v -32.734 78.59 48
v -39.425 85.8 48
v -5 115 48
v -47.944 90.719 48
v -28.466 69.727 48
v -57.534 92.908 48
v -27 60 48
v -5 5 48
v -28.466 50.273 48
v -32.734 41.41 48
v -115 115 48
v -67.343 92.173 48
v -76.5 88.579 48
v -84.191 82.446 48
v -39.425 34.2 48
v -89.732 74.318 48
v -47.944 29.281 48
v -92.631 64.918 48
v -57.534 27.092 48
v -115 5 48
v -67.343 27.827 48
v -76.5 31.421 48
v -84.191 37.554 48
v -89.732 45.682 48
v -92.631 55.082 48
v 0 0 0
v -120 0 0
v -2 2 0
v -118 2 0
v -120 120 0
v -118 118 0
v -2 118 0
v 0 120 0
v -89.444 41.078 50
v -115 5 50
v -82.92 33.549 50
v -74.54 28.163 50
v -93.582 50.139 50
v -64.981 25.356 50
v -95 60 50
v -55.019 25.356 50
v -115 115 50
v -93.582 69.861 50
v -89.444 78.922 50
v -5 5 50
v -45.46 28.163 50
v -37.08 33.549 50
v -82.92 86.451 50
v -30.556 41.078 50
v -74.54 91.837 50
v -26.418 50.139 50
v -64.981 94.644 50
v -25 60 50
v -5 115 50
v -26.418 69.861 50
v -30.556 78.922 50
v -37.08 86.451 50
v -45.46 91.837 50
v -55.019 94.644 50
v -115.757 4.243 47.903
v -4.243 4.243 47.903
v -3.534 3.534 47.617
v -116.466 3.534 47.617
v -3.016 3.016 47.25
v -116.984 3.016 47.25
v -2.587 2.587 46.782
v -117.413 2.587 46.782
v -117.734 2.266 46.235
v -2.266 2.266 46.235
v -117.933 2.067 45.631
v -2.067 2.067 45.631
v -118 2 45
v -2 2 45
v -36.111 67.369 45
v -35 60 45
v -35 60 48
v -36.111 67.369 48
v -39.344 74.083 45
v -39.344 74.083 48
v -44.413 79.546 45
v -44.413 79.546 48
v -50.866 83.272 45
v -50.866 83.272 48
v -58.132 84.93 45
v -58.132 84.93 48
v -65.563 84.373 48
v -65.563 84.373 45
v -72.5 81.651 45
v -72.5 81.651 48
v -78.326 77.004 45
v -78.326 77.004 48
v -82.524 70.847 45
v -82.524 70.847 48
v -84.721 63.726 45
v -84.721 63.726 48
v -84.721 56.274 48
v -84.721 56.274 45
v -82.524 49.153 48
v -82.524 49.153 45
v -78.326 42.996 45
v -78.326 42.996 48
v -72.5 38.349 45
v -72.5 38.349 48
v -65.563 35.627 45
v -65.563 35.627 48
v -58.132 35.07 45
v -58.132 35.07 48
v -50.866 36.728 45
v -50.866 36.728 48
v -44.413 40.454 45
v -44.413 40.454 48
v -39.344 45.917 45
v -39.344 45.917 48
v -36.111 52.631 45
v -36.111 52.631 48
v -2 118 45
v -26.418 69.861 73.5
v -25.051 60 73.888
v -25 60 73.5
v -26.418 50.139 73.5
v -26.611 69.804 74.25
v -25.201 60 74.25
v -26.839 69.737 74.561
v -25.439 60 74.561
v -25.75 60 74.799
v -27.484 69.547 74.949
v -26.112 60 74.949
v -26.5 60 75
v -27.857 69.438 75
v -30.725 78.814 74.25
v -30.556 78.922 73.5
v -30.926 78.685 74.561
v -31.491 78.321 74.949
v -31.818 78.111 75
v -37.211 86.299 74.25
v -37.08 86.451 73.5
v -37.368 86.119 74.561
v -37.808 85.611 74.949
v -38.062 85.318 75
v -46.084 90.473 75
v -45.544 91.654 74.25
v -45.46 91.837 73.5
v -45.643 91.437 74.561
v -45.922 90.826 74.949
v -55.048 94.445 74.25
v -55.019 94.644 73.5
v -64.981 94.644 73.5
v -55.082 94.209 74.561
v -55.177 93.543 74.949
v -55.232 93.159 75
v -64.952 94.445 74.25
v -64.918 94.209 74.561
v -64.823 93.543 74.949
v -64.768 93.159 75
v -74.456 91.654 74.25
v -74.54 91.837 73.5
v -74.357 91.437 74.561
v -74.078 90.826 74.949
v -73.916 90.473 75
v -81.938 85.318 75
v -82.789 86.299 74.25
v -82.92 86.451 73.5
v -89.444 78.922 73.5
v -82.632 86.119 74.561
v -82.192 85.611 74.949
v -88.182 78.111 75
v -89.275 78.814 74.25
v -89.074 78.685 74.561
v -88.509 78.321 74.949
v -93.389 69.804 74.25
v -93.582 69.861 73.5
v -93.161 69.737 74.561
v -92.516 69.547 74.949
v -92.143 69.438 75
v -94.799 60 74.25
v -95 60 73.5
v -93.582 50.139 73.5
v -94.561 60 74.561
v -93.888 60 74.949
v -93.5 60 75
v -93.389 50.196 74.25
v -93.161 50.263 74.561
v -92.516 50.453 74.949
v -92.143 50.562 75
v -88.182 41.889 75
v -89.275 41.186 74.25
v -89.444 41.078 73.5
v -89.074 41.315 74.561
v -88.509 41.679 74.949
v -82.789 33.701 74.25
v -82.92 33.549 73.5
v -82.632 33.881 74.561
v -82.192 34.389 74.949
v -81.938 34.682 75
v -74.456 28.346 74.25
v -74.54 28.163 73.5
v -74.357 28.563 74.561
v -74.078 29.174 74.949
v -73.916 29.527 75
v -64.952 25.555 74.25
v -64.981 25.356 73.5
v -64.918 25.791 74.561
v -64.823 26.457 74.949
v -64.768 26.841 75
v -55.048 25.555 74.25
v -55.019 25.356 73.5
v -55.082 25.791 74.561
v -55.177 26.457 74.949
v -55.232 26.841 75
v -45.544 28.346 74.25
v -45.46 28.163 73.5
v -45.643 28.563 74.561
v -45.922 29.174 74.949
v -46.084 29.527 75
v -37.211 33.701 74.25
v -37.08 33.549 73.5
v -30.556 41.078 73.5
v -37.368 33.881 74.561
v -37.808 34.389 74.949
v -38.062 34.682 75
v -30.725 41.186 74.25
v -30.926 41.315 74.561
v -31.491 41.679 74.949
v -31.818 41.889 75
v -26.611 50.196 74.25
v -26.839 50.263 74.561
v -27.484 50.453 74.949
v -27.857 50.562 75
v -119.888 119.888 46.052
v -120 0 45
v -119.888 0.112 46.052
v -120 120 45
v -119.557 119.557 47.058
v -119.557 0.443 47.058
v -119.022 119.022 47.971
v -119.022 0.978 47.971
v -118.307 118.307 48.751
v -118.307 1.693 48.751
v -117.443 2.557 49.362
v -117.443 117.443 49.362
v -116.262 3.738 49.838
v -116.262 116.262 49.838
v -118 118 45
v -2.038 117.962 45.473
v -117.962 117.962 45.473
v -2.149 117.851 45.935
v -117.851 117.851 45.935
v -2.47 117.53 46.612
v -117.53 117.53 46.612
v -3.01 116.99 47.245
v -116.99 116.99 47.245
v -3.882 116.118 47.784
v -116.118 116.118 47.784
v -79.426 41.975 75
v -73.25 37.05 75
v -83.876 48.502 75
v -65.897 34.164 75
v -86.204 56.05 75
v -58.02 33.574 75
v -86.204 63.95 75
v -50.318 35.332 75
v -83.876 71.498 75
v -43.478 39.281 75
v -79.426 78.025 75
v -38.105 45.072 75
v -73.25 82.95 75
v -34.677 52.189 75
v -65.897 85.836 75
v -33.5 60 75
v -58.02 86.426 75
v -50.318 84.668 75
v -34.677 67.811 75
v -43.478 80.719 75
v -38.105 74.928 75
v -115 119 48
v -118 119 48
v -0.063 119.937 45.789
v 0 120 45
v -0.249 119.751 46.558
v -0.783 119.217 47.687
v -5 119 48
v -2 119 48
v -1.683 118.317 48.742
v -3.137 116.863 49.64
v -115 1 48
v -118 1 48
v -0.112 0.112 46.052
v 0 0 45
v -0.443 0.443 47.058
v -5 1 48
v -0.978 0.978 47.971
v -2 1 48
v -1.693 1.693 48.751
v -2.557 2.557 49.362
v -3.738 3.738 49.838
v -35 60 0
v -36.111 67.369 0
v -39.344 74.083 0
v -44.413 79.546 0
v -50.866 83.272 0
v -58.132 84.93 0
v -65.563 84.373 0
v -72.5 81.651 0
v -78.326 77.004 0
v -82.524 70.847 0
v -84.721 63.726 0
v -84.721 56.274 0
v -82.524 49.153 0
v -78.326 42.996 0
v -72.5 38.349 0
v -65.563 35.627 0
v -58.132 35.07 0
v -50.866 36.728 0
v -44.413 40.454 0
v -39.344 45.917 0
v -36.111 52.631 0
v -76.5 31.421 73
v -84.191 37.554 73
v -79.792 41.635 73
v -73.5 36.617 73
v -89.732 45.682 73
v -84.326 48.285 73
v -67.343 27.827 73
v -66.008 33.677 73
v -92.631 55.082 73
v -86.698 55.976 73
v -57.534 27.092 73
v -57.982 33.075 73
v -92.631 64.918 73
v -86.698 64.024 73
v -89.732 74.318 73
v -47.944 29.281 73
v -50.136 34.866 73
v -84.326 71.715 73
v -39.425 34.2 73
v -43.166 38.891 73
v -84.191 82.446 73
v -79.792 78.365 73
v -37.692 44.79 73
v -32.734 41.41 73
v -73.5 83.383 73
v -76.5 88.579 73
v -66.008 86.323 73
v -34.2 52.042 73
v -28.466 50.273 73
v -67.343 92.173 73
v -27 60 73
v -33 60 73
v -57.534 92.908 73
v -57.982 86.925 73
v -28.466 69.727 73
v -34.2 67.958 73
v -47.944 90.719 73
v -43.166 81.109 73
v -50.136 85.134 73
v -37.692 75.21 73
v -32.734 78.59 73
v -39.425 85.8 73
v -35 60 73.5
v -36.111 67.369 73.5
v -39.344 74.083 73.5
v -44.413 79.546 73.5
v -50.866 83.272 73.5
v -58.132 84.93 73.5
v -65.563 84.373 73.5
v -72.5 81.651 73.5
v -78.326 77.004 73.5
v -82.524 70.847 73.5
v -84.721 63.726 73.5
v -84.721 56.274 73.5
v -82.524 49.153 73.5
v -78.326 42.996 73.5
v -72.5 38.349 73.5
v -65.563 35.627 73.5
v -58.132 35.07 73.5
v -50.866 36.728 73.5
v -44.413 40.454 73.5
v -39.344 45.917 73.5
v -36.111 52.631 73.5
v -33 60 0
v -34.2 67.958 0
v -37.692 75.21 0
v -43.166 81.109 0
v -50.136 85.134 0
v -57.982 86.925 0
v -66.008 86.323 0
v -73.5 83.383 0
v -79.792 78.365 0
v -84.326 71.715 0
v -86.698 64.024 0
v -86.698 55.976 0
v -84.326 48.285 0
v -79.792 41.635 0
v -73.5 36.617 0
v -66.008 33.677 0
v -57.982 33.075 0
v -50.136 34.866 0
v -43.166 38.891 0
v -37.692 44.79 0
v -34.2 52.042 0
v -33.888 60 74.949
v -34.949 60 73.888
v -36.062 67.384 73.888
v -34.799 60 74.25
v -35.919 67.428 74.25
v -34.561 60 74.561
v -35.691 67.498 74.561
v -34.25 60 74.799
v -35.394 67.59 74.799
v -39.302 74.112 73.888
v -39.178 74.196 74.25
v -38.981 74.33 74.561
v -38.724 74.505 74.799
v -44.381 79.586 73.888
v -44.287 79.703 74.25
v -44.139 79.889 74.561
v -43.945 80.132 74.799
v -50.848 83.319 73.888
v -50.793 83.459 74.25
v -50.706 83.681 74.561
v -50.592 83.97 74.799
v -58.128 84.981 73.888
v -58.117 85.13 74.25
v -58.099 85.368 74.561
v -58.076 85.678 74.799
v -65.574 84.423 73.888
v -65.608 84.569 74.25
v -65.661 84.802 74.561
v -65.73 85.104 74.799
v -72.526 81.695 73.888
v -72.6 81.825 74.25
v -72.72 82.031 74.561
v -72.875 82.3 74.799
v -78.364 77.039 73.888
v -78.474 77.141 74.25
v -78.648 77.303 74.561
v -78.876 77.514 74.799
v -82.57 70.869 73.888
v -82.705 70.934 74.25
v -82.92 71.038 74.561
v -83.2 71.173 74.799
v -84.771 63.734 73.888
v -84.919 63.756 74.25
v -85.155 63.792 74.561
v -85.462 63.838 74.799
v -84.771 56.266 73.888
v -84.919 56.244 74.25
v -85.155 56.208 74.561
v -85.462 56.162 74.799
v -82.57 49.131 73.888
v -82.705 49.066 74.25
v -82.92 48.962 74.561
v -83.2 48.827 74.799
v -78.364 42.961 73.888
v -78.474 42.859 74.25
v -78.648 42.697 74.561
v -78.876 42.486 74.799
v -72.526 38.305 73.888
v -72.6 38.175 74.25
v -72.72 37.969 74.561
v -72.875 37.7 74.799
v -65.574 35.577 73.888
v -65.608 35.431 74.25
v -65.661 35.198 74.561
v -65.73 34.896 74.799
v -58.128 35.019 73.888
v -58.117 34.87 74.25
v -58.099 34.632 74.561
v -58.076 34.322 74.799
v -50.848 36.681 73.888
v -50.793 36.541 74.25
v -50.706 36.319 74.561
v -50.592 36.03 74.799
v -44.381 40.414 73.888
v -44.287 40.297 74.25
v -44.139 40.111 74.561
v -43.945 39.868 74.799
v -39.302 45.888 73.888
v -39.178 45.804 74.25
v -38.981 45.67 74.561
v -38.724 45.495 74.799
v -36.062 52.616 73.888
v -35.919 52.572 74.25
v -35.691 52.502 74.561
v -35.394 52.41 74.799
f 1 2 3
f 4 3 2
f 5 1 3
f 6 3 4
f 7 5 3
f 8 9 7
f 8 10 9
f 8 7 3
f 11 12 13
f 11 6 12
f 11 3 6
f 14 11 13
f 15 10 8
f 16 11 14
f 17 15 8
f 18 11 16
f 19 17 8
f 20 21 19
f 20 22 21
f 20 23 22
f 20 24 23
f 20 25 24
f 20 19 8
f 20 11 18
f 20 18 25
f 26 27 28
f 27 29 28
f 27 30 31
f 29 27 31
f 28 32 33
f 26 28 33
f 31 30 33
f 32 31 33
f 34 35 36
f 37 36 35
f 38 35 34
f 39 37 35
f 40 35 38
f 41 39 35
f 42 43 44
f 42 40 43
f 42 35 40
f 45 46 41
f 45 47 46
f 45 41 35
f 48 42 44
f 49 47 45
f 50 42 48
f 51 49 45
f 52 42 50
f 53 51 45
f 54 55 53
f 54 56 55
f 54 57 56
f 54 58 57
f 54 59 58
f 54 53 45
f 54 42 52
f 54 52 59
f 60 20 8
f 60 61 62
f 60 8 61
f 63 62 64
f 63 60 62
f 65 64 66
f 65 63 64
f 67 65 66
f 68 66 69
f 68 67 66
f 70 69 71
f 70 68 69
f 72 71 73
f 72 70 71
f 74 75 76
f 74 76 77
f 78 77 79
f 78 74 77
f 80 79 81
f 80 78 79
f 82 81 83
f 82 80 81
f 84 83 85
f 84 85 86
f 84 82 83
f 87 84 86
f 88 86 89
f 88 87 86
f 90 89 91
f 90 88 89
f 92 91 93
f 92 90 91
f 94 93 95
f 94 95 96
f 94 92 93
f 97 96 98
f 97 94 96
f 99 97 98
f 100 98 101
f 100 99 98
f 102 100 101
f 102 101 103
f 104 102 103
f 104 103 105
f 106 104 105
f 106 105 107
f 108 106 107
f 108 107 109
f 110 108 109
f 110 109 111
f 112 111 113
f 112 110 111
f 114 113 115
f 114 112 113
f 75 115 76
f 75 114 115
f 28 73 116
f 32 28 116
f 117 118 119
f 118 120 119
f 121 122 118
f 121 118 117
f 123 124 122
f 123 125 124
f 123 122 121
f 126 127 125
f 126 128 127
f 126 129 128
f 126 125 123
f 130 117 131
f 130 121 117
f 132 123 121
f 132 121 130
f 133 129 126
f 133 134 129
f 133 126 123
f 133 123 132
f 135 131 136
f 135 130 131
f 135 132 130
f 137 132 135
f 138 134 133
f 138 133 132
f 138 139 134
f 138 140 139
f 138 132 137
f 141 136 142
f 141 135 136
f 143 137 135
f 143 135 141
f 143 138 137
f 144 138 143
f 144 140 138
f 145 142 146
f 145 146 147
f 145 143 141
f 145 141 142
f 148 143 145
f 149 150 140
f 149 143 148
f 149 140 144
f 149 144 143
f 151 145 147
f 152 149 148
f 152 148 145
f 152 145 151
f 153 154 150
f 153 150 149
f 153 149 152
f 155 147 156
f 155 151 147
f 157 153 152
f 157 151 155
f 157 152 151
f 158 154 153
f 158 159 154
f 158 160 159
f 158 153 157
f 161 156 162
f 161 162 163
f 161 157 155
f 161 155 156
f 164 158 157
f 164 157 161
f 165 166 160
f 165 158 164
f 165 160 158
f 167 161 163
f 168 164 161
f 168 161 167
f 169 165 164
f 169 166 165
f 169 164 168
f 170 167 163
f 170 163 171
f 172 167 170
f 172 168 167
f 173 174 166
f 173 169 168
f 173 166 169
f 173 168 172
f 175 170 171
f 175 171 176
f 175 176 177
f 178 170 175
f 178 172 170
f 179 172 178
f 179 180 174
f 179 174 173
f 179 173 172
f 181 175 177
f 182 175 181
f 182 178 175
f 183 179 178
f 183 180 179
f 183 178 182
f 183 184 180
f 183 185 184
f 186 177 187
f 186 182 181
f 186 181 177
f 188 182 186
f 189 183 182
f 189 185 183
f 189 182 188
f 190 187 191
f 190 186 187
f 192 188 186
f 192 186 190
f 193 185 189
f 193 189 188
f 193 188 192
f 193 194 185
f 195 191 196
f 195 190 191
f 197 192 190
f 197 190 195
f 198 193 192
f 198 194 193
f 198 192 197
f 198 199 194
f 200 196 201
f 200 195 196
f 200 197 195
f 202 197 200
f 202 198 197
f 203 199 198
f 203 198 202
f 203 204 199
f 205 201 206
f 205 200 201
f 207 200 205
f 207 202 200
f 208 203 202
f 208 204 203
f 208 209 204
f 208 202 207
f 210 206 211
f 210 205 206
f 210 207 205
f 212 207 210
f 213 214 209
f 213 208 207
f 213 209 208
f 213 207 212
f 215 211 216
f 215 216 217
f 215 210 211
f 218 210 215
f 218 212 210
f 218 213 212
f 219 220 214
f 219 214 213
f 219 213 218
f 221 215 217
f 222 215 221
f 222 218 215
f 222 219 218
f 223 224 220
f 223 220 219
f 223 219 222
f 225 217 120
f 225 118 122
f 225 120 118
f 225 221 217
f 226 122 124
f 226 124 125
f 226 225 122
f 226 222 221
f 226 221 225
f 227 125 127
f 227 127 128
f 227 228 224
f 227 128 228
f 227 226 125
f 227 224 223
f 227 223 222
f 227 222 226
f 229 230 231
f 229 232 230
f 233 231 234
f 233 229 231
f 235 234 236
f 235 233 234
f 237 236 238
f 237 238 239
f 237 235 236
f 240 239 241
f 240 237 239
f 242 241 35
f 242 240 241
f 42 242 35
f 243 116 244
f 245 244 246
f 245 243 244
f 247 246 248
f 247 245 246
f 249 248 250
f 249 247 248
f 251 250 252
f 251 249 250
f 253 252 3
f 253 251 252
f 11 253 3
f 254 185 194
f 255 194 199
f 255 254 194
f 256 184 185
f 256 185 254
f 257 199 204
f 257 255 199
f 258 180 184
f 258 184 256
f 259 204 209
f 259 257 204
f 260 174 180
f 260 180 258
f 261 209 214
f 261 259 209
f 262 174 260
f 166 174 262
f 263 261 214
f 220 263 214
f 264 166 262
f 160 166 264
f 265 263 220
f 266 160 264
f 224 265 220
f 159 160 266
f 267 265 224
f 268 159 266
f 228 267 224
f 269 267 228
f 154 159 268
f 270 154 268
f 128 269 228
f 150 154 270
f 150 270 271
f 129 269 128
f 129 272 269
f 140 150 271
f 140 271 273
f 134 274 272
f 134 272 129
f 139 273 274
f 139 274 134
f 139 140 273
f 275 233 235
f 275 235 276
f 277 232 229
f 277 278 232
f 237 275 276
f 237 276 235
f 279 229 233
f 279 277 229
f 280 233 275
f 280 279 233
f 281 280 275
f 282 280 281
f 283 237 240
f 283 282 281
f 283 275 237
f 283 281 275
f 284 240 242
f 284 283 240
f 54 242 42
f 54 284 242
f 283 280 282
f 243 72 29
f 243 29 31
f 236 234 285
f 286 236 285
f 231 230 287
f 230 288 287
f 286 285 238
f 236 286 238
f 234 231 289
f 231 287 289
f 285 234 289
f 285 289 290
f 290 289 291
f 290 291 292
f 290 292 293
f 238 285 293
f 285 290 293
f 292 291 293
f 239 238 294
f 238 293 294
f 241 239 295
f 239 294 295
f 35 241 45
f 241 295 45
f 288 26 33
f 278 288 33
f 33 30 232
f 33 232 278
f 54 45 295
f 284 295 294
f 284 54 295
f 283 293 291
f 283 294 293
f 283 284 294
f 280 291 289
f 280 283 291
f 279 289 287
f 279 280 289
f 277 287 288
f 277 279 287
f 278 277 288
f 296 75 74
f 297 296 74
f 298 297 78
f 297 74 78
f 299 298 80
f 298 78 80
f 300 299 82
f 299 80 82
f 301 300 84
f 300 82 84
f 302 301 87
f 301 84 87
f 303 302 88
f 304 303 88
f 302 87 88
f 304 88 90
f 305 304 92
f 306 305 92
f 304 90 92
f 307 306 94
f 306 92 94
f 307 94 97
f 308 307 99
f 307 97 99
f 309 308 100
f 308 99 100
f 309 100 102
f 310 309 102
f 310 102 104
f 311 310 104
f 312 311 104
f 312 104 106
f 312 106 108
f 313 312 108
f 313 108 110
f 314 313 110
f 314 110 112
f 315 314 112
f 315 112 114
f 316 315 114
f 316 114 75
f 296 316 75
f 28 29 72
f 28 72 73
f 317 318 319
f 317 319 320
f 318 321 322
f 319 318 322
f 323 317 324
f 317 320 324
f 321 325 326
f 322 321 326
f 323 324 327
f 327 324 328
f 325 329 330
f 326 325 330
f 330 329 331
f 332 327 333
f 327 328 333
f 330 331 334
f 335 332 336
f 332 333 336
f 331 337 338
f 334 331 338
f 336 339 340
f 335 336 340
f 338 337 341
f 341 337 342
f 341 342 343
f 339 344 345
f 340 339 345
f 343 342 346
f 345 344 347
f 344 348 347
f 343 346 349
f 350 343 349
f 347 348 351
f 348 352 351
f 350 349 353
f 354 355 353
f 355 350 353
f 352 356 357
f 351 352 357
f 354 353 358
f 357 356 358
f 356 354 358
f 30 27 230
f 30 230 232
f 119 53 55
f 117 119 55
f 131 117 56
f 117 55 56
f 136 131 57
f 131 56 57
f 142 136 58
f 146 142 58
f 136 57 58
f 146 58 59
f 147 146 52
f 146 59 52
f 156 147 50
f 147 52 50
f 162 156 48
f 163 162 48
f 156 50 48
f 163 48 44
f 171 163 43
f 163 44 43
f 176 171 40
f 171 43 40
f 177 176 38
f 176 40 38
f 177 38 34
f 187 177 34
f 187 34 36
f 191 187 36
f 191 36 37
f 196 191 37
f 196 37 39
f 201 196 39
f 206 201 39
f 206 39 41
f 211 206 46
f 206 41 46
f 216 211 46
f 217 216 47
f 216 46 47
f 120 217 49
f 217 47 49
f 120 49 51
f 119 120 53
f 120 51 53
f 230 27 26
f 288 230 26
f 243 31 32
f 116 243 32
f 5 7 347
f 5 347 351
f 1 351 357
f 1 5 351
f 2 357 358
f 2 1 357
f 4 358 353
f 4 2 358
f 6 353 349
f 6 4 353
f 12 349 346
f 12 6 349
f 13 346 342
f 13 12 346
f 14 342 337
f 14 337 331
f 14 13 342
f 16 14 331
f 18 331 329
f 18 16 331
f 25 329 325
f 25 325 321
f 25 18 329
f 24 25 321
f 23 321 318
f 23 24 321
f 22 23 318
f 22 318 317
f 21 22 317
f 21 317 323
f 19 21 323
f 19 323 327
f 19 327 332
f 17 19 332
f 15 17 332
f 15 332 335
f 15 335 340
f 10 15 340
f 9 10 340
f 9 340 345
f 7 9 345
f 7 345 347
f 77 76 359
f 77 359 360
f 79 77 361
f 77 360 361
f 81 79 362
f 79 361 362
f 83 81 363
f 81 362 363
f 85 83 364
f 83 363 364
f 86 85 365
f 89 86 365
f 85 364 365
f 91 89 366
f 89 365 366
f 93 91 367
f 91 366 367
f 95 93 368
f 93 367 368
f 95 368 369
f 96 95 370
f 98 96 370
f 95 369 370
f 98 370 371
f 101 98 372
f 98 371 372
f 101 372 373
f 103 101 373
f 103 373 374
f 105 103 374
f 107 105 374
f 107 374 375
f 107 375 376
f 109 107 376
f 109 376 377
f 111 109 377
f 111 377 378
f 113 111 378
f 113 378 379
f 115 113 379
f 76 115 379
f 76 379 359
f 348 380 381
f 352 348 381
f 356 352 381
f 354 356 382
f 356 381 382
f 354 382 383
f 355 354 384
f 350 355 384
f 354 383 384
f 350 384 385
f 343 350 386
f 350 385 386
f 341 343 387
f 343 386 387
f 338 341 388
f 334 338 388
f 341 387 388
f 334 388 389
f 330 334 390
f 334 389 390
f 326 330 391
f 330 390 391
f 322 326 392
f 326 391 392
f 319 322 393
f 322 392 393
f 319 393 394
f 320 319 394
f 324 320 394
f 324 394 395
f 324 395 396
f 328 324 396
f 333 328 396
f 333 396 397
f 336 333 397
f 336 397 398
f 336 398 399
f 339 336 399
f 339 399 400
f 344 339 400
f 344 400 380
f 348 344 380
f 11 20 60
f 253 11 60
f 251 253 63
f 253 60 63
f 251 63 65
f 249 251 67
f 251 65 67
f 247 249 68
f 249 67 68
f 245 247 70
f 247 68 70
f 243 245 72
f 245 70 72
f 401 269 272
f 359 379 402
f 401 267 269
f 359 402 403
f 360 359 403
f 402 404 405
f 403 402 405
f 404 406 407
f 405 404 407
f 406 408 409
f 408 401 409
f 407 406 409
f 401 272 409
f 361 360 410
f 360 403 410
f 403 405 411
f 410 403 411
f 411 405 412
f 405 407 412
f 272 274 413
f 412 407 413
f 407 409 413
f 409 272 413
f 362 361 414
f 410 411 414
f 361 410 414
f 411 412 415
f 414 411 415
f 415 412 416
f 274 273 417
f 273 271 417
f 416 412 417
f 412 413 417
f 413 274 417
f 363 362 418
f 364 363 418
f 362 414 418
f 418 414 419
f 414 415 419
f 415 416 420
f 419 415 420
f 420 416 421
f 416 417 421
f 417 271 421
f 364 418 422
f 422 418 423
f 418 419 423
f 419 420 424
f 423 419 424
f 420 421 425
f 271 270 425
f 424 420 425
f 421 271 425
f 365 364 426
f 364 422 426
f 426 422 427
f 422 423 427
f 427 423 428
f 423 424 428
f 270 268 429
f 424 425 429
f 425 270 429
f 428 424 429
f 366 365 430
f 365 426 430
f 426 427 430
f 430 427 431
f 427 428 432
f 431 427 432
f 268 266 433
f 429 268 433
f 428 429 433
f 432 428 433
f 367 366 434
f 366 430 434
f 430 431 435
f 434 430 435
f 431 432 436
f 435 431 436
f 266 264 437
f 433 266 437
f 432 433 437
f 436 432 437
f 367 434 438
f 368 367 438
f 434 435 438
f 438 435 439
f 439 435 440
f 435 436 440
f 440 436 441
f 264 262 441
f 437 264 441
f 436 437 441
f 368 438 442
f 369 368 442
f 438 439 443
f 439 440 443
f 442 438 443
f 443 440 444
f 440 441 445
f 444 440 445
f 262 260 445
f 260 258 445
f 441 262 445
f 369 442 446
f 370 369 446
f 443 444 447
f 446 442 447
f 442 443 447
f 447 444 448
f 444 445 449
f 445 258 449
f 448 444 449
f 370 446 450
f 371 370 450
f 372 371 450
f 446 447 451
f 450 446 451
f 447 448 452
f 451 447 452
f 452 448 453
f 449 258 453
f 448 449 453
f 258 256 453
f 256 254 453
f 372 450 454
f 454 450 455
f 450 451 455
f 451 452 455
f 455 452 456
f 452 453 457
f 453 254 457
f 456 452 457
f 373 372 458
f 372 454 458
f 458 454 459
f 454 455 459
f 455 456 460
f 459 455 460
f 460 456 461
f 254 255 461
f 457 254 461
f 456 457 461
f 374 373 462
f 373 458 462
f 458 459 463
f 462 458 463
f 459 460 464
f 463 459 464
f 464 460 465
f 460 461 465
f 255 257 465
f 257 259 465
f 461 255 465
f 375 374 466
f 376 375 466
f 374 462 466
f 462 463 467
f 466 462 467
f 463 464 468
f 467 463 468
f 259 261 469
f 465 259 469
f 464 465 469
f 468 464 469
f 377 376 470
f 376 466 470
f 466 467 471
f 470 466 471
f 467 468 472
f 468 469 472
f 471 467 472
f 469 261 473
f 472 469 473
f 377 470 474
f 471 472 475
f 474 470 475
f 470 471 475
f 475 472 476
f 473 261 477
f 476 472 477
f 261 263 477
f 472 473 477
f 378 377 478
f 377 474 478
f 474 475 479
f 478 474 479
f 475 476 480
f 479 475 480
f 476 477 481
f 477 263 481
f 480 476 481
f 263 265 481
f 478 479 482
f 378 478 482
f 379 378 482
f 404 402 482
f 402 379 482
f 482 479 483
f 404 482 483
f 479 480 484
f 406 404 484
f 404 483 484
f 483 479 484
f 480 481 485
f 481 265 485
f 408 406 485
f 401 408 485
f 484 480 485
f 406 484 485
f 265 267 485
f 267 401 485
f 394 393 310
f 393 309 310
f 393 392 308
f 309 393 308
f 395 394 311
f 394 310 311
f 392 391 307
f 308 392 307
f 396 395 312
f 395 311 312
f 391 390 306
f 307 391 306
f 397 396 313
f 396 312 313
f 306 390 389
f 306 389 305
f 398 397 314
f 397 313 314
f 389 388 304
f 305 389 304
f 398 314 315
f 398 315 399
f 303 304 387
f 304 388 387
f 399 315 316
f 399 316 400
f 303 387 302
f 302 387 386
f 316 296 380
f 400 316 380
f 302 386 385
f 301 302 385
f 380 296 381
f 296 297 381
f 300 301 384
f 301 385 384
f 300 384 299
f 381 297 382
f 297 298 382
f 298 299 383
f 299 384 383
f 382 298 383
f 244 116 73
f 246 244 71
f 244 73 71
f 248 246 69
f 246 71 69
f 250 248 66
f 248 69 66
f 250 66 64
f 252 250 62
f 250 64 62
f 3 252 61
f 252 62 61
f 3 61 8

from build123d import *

# Parameters (mm, degrees)
SKETCH2_W            = 120
SKETCH2_H            = 120
BOSS_EXTRUDE1_DEPTH  = 50
SKETCH3_R            = 35
BOSS_EXTRUDE2_DEPTH  = 25
SKETCH4_R            = 25
CUT_EXTRUDE1_DEPTH   = 186.539753153
FILLET1_R            = 5
FILLET2_R            = 1.5
SHELL1_OUTLINE_W     = 116
SHELL1_OUTLINE_H     = 116
SHELL1_OUTLINE_R     = 27
SHELL1_DEPTH         = 45
SHELL1_2_OUTLINE_R   = 33
SHELL1_2_OUTLINE_R_2 = 27
SHELL1_2_DEPTH       = 73
SHELL1_START         = -118
SHELL1_3_DEPTH       = 116
SHELL1_START_2       = 1
SHELL1_4_DEPTH       = 118
SHELL1_START_3       = 45
SHELL1_5_OUTLINE_R   = 27
SHELL1_5_OUTLINE_R_2 = 25
SHELL1_5_DEPTH       = 3


with BuildPart() as part:
    # Sketch2 → Boss-Extrude1 (new body)
    with BuildSketch(Plane.XY):
        with Locations((-60, 60)):
            Rectangle(SKETCH2_W, SKETCH2_H)
    extrude(amount=BOSS_EXTRUDE1_DEPTH)

    # Sketch3 → Boss-Extrude2 (add)
    with BuildSketch(Plane.XY.offset(50)):
        with Locations((-60, 60)):
            Circle(SKETCH3_R)
    extrude(amount=BOSS_EXTRUDE2_DEPTH)

    # Sketch4 → Cut-Extrude1 (cut, through all)
    with BuildSketch(Plane.XY.offset(75)):
        with Locations((-60, 60)):
            Circle(SKETCH4_R)
    extrude(amount=-CUT_EXTRUDE1_DEPTH, mode=Mode.SUBTRACT)

    # Fillet1
    fillet1_edges = [part.edges().sort_by_distance(p)[0] for p in [
        (-120, 60, 50),
        (-60, 0, 50),
        (0, 60, 50),
        (-60, 120, 50),
    ]]
    fillet(fillet1_edges, radius=FILLET1_R)

    # Fillet2
    fillet2_edges = [part.edges().sort_by_distance(p)[0] for p in [
        (-95, 60, 75),
        (-85, 60, 75),
    ]]
    fillet(fillet2_edges, radius=FILLET2_R)

    # Shell1: read off the stored shape, not the designer's step
    # Shell1 outline → Shell1 (cut)
    with BuildSketch(Plane.XY):
        with Locations((-60, 60)):
            Rectangle(SHELL1_OUTLINE_W, SHELL1_OUTLINE_H)
        with Locations((-60, 60)):
            Circle(SHELL1_OUTLINE_R, mode=Mode.SUBTRACT)
    extrude(amount=SHELL1_DEPTH, mode=Mode.SUBTRACT)

    # Shell1 2 outline → Shell1 2 (cut)
    with BuildSketch(Plane.XY):
        with Locations((-60, 60)):
            Circle(SHELL1_2_OUTLINE_R)
        with Locations((-60, 60)):
            Circle(SHELL1_2_OUTLINE_R_2, mode=Mode.SUBTRACT)
    extrude(amount=SHELL1_2_DEPTH, mode=Mode.SUBTRACT)

    # Shell1 3 outline → Shell1 3 (cut)
    with BuildSketch(Plane.YZ.offset(SHELL1_START)):
        with BuildLine():
            ThreePointArc((118, 45), (117.121320344, 47.121320344), (115, 48))
            Line((115, 48), (5, 48))
            ThreePointArc((5, 48), (2.878679656, 47.121320344), (2, 45))
            Line((2, 45), (118, 45))
        make_face()
    extrude(amount=SHELL1_3_DEPTH, mode=Mode.SUBTRACT)

    # Shell1 4 outline → Shell1 4 (add)
    with BuildSketch(Plane(origin=(0, 0, 0), x_dir=(1, 0, 0), z_dir=(0, 1, 0)).offset(SHELL1_START_2)):
        with BuildLine():
            ThreePointArc((-2, -45), (-2.878679656, -47.121320344), (-5, -48))
            Line((-5, -48), (-2, -48))
            Line((-2, -48), (-2, -45))
        make_face()
        with BuildLine():
            ThreePointArc((-115, -48), (-117.121320344, -47.121320344), (-118, -45))
            Line((-118, -45), (-118, -48))
            Line((-118, -48), (-115, -48))
        make_face()
    extrude(amount=SHELL1_4_DEPTH)

    # Shell1 5 outline → Shell1 5 (add)
    with BuildSketch(Plane.XY.offset(SHELL1_START_3)):
        with Locations((-60, 60)):
            Circle(SHELL1_5_OUTLINE_R)
        with Locations((-60, 60)):
            Circle(SHELL1_5_OUTLINE_R_2, mode=Mode.SUBTRACT)
    extrude(amount=SHELL1_5_DEPTH)


solid = part.part
